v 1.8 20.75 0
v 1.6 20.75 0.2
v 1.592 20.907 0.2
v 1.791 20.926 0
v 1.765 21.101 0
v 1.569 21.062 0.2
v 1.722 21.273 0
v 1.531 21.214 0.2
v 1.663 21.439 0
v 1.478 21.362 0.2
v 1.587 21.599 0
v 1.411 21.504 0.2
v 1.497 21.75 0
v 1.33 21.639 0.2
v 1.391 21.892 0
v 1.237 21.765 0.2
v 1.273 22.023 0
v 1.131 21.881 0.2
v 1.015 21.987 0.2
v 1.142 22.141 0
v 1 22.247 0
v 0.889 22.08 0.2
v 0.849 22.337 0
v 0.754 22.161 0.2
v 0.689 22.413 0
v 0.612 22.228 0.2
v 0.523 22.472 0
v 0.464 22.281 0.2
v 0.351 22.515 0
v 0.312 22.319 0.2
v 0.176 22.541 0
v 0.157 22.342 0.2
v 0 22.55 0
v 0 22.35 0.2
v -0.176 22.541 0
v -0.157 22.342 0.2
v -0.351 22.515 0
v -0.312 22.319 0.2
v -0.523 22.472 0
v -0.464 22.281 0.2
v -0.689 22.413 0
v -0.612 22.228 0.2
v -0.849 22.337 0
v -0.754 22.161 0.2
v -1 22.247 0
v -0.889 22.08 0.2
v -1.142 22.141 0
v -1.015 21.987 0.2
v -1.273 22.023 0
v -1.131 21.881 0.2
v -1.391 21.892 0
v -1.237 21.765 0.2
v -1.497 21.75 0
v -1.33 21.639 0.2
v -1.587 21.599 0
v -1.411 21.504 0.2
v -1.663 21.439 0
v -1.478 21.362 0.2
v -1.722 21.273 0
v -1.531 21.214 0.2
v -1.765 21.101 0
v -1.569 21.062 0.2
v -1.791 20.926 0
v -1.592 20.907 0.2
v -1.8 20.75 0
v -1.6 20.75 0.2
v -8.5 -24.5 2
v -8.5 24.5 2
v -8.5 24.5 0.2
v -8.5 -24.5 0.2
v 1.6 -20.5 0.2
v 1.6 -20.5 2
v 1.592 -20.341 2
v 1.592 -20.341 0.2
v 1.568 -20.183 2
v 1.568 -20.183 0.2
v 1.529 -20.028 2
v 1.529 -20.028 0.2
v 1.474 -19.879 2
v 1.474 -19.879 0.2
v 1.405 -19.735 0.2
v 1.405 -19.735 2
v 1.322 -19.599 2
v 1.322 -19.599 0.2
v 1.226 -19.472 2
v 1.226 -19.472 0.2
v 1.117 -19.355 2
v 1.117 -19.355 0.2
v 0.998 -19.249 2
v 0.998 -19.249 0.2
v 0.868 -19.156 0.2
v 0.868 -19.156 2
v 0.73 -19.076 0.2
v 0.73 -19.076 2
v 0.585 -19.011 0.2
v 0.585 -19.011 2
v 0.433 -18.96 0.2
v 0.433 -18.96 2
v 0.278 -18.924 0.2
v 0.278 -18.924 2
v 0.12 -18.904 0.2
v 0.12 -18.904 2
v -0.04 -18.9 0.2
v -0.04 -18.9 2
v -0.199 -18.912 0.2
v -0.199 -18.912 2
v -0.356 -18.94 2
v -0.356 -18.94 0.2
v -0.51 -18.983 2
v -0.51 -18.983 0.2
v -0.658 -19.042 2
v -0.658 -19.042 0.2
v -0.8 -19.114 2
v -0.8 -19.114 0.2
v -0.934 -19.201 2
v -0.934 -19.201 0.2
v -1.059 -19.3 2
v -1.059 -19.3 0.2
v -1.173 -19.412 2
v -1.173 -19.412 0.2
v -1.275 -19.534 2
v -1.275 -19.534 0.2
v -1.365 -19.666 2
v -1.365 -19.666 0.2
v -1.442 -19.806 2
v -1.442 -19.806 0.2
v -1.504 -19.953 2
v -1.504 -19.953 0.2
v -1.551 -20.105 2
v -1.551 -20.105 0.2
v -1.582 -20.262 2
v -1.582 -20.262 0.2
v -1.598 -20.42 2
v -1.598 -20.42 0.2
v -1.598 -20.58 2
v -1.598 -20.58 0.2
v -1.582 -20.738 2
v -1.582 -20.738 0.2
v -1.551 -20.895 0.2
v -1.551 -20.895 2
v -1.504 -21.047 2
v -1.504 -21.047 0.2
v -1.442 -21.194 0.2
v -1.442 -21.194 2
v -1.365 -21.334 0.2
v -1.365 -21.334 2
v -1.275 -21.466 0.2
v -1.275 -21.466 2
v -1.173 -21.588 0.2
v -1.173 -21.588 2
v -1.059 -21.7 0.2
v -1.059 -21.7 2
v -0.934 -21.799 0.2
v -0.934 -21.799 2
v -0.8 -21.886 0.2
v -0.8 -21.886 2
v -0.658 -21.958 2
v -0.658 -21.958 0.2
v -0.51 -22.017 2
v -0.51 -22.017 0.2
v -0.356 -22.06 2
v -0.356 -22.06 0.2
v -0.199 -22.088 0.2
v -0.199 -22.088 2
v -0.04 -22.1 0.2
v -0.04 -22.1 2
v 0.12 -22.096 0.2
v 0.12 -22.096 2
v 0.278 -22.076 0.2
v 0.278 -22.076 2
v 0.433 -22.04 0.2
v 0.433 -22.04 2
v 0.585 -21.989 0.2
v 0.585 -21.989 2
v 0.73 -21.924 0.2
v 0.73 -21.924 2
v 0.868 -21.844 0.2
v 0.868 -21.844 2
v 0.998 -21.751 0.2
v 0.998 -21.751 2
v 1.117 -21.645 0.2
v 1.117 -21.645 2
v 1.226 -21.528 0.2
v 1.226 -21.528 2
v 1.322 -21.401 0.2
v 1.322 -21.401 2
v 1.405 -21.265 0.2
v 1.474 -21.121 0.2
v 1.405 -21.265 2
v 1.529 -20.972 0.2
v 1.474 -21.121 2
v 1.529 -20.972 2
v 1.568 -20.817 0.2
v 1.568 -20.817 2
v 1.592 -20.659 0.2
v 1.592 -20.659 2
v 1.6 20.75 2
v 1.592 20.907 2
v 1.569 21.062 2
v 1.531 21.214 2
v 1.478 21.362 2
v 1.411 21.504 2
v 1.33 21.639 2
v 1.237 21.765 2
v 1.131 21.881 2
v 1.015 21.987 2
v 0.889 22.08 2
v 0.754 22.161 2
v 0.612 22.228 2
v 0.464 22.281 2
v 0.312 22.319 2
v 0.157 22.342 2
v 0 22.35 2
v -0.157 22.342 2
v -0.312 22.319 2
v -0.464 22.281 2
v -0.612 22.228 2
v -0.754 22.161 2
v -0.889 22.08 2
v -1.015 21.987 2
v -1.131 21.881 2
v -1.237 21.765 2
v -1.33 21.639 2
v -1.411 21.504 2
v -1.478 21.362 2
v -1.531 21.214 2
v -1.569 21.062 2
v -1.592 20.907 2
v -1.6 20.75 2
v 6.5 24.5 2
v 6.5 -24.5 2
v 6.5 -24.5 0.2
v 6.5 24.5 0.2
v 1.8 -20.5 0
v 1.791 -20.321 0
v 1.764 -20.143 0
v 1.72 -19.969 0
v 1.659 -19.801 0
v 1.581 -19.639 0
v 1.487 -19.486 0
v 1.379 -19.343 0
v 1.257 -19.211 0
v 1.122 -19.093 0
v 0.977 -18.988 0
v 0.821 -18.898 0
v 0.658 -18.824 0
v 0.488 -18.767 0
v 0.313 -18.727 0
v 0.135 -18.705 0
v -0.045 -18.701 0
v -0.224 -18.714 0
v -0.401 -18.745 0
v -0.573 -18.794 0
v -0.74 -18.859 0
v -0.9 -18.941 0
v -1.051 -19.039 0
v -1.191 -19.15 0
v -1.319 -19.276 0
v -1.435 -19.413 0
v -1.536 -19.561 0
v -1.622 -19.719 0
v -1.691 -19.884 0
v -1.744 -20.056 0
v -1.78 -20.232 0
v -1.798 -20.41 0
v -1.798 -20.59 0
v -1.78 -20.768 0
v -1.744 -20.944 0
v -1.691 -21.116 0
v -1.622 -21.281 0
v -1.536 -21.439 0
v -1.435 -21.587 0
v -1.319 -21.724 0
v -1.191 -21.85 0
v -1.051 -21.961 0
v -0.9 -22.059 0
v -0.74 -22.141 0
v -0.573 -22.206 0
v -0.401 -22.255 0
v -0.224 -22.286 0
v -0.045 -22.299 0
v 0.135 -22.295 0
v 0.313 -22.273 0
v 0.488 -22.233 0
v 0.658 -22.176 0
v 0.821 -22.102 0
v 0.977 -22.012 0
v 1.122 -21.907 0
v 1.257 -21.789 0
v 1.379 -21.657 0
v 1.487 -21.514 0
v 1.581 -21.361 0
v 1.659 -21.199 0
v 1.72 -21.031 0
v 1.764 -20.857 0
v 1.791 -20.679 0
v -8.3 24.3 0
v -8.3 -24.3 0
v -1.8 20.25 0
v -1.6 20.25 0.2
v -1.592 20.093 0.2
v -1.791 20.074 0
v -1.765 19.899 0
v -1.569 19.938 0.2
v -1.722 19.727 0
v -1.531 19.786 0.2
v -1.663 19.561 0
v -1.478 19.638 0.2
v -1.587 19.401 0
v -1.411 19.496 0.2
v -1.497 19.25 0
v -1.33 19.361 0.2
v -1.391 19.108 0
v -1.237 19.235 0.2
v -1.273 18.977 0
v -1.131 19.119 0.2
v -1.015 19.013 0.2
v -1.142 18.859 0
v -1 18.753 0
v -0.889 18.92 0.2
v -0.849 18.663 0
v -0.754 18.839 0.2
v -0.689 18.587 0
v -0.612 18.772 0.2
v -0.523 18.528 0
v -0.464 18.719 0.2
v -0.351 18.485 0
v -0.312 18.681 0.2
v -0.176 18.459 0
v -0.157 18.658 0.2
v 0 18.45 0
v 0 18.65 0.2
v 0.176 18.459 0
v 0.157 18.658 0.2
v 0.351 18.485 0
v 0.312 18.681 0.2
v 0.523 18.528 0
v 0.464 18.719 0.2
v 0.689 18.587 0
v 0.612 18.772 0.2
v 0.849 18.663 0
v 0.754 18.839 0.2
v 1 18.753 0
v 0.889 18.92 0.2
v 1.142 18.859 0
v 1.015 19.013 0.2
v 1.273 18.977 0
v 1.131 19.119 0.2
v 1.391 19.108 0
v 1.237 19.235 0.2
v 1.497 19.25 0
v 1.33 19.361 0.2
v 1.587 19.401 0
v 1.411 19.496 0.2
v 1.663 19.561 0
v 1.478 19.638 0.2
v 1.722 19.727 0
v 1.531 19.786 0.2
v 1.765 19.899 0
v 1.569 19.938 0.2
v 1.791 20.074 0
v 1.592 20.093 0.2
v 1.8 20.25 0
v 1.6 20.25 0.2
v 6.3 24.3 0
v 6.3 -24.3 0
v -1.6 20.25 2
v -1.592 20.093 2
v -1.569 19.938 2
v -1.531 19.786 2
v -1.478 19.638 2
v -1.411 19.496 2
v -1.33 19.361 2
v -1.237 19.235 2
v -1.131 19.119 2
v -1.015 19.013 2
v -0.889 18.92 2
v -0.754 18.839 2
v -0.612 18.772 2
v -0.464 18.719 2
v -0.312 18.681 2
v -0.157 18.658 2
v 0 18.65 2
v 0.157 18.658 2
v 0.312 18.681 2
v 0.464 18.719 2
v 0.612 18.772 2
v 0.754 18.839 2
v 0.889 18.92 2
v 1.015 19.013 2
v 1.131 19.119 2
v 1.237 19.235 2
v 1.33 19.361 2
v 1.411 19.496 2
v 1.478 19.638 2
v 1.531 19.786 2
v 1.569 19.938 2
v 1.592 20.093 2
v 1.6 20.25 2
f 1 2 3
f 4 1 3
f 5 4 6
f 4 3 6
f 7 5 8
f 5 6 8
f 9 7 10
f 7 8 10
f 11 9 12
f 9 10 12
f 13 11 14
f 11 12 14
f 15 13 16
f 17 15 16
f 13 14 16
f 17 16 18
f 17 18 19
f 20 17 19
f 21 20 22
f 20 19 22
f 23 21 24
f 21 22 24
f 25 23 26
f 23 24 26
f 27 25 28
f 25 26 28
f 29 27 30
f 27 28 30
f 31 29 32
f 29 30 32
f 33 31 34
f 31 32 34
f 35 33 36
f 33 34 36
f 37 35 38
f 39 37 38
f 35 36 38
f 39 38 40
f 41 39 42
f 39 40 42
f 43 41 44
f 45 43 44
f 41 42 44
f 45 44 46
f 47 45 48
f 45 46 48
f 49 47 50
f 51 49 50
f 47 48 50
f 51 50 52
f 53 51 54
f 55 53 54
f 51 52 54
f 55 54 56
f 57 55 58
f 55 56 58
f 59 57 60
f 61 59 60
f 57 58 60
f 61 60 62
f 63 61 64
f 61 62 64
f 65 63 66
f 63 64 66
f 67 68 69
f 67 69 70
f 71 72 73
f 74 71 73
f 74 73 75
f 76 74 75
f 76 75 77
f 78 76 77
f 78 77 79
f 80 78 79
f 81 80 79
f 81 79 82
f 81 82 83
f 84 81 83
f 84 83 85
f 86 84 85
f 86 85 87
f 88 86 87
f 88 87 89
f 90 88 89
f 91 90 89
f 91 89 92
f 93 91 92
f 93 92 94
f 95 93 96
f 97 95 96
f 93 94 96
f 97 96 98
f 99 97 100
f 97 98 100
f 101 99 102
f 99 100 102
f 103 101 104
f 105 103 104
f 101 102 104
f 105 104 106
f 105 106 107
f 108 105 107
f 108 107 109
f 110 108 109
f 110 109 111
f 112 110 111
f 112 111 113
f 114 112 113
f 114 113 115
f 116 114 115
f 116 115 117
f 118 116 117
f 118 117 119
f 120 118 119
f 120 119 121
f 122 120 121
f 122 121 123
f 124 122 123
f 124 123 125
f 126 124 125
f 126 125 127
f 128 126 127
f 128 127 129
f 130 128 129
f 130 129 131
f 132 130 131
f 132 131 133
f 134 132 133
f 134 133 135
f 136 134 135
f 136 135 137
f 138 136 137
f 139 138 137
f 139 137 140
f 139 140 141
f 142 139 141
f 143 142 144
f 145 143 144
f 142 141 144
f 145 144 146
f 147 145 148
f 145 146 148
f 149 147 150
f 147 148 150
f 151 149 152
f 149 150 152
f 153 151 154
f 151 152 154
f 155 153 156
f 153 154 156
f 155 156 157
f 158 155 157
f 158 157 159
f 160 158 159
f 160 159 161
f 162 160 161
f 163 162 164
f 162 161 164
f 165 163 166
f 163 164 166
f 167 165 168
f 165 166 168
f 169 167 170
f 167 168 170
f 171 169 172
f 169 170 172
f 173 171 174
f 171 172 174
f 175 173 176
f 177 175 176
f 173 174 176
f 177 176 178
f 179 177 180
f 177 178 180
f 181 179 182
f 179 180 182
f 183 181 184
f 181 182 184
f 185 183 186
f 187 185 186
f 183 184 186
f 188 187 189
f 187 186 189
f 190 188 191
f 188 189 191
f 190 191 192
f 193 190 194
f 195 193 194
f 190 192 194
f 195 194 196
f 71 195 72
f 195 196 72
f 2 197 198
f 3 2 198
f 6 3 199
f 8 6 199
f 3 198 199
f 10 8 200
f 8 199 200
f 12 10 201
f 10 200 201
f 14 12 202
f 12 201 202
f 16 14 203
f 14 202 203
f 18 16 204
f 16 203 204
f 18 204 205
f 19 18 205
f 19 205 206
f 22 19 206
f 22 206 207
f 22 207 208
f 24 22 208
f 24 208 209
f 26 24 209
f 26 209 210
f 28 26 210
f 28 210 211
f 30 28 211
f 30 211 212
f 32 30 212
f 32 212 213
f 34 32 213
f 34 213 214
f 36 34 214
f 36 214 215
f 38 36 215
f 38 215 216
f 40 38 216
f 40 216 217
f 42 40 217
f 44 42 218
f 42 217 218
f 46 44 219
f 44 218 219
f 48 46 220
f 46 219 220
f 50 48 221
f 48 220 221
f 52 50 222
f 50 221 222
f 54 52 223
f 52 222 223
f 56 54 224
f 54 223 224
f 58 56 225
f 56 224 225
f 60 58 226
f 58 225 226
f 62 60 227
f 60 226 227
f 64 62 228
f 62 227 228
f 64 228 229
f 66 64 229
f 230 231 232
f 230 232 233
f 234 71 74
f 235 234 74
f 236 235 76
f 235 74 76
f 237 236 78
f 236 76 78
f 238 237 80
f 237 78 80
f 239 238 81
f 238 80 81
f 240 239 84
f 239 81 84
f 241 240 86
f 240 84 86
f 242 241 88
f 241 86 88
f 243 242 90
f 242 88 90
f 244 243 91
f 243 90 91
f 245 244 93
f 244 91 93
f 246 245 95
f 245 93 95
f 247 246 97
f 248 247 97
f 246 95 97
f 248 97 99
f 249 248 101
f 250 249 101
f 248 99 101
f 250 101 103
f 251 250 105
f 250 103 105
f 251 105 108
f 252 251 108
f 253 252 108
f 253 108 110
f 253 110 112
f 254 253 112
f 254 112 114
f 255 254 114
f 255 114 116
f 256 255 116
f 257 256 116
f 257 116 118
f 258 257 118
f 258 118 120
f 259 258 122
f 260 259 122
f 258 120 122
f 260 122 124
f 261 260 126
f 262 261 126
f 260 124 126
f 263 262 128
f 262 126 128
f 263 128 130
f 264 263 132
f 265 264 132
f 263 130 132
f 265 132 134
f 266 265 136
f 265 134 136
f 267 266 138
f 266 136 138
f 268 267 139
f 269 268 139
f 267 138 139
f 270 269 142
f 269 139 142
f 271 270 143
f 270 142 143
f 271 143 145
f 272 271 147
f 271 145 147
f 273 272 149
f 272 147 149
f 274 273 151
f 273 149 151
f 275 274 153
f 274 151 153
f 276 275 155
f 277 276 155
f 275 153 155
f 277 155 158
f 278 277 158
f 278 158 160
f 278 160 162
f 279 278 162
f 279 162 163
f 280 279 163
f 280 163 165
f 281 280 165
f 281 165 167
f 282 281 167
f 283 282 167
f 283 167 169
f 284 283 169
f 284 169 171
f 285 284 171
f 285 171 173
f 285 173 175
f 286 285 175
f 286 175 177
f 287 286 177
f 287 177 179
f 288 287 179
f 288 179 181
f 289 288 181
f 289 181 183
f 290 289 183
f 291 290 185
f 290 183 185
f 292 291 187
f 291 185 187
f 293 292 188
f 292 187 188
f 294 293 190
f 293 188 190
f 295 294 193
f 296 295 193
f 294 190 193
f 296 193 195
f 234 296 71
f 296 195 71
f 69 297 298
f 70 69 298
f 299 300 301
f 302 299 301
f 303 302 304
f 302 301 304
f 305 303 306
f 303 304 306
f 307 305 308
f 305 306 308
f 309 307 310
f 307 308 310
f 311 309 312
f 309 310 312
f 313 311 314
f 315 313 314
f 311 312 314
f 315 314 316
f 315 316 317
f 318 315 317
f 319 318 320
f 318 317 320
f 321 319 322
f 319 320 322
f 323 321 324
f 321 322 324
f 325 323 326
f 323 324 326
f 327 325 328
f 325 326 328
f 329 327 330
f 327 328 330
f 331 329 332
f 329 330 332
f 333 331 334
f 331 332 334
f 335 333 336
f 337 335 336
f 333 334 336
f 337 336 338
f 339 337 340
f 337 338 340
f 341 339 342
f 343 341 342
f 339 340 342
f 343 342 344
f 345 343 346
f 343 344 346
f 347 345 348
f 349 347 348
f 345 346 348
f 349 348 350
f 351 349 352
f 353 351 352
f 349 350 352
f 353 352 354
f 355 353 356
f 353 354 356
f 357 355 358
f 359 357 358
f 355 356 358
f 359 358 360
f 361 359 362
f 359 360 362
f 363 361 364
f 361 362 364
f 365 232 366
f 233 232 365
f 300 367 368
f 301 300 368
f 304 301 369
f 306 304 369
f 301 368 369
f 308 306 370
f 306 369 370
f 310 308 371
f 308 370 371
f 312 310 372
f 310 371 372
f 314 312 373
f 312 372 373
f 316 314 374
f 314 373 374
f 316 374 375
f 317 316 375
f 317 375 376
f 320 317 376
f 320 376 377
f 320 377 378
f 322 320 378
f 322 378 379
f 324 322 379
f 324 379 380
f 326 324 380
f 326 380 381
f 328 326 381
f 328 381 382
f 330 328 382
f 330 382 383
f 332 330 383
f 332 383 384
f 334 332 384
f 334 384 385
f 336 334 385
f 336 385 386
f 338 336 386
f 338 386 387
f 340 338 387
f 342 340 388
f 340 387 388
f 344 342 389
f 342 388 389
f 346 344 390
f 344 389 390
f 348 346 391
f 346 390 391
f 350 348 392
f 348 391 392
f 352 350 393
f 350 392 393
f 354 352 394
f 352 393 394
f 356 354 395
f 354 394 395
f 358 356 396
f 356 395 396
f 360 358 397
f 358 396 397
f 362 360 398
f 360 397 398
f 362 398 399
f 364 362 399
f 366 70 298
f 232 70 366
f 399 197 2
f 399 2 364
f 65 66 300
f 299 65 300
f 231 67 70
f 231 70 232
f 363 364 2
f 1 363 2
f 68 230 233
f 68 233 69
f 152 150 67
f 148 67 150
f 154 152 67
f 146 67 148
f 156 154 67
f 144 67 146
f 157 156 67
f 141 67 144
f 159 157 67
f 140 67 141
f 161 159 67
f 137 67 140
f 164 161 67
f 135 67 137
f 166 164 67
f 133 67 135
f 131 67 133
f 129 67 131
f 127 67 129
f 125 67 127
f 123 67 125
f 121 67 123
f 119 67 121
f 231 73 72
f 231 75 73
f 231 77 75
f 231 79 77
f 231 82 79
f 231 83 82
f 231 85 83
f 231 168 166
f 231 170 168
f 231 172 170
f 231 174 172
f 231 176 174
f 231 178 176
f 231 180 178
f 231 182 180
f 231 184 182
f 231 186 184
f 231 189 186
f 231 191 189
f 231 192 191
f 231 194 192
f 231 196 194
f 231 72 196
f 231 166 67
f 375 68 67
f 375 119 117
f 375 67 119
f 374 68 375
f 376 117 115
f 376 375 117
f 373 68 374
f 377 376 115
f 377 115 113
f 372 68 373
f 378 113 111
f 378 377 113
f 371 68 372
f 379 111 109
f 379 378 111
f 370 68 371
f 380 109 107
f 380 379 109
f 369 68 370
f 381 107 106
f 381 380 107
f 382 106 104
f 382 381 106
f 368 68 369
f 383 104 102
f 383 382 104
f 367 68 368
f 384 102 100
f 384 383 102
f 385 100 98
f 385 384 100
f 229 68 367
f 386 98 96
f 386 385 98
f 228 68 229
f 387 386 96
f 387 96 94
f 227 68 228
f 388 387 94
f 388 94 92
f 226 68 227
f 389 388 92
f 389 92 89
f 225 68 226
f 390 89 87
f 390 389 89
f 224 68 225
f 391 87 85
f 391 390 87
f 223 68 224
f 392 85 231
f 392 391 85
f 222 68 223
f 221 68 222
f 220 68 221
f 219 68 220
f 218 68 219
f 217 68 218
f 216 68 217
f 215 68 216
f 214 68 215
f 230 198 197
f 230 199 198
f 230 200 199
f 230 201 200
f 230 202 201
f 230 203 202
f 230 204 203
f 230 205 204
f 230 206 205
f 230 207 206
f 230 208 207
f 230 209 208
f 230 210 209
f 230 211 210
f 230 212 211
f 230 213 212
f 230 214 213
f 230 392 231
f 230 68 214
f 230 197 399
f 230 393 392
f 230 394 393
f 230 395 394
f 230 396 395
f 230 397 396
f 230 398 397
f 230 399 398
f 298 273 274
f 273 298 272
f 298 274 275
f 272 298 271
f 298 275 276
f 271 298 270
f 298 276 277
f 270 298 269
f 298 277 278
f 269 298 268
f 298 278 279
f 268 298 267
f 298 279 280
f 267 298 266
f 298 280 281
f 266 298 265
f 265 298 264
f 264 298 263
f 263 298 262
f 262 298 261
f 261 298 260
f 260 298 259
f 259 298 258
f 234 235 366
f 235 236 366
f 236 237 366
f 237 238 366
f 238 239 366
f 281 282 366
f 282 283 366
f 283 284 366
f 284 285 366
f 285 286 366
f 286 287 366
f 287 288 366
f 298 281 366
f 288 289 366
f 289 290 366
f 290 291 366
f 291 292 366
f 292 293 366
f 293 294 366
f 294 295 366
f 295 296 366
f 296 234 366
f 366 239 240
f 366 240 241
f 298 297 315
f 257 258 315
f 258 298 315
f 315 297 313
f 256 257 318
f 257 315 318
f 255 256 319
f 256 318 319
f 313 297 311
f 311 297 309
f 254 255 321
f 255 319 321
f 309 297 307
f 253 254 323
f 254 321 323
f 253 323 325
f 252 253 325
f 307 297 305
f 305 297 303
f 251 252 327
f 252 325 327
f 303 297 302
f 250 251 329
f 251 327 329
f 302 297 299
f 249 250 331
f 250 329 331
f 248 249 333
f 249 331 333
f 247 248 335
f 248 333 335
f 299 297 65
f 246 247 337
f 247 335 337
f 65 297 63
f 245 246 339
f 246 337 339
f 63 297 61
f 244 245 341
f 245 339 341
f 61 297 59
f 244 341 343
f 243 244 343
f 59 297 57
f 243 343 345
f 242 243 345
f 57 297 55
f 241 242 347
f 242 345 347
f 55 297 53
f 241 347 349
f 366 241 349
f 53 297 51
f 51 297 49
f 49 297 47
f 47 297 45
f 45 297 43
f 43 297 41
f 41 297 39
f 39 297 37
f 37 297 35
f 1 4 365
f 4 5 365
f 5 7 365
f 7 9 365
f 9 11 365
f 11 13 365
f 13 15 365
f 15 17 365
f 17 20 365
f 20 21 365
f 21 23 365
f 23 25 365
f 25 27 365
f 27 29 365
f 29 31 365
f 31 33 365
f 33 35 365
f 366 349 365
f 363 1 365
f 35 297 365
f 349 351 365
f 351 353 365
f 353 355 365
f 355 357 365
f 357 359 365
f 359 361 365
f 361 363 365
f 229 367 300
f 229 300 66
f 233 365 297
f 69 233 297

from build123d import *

# Parameters (mm, degrees)
F0_W    = 15
F0_H    = 49
F0_R    = 1.6
F3_SIZE = 0.2


with BuildPart() as f2:
    # F2: sweep along a path in F1
    with BuildLine(Plane.XZ) as f2_path:
        Line((0, 0), (0, 2))
    # F0 (on Top) → F2 (sweep)
    with BuildSketch(Plane.XY):
        with Locations((-1, 0)):
            Rectangle(F0_W, F0_H)
        with Locations((0, -20.5)):
            Circle(F0_R, mode=Mode.SUBTRACT)
        with BuildLine():
            Line((-1.6, 20.25), (-1.6, 20.75))
            ThreePointArc((-1.6, 20.75), (0, 22.35), (1.6, 20.75))
            Line((1.6, 20.75), (1.6, 20.25))
            ThreePointArc((1.6, 20.25), (0, 18.65), (-1.6, 20.25))
        make_face(mode=Mode.SUBTRACT)
    sweep(path=f2_path.line)

    # F3
    f3_edges = [f2.edges().sort_by_distance(p)[0] for p in [
        (6.5, 0, 0),
        (-1, -24.5, 0),
        (-1, 24.5, 0),
        (-8.5, 0, 0),
        (-1.6, -20.5, 0),
        (0, 18.65, 0),
        (1.6, 20.5, 0),
        (0, 22.35, 0),
        (-1.6, 20.5, 0),
    ]]
    chamfer(f3_edges, length=F3_SIZE)


solid = f2.part
